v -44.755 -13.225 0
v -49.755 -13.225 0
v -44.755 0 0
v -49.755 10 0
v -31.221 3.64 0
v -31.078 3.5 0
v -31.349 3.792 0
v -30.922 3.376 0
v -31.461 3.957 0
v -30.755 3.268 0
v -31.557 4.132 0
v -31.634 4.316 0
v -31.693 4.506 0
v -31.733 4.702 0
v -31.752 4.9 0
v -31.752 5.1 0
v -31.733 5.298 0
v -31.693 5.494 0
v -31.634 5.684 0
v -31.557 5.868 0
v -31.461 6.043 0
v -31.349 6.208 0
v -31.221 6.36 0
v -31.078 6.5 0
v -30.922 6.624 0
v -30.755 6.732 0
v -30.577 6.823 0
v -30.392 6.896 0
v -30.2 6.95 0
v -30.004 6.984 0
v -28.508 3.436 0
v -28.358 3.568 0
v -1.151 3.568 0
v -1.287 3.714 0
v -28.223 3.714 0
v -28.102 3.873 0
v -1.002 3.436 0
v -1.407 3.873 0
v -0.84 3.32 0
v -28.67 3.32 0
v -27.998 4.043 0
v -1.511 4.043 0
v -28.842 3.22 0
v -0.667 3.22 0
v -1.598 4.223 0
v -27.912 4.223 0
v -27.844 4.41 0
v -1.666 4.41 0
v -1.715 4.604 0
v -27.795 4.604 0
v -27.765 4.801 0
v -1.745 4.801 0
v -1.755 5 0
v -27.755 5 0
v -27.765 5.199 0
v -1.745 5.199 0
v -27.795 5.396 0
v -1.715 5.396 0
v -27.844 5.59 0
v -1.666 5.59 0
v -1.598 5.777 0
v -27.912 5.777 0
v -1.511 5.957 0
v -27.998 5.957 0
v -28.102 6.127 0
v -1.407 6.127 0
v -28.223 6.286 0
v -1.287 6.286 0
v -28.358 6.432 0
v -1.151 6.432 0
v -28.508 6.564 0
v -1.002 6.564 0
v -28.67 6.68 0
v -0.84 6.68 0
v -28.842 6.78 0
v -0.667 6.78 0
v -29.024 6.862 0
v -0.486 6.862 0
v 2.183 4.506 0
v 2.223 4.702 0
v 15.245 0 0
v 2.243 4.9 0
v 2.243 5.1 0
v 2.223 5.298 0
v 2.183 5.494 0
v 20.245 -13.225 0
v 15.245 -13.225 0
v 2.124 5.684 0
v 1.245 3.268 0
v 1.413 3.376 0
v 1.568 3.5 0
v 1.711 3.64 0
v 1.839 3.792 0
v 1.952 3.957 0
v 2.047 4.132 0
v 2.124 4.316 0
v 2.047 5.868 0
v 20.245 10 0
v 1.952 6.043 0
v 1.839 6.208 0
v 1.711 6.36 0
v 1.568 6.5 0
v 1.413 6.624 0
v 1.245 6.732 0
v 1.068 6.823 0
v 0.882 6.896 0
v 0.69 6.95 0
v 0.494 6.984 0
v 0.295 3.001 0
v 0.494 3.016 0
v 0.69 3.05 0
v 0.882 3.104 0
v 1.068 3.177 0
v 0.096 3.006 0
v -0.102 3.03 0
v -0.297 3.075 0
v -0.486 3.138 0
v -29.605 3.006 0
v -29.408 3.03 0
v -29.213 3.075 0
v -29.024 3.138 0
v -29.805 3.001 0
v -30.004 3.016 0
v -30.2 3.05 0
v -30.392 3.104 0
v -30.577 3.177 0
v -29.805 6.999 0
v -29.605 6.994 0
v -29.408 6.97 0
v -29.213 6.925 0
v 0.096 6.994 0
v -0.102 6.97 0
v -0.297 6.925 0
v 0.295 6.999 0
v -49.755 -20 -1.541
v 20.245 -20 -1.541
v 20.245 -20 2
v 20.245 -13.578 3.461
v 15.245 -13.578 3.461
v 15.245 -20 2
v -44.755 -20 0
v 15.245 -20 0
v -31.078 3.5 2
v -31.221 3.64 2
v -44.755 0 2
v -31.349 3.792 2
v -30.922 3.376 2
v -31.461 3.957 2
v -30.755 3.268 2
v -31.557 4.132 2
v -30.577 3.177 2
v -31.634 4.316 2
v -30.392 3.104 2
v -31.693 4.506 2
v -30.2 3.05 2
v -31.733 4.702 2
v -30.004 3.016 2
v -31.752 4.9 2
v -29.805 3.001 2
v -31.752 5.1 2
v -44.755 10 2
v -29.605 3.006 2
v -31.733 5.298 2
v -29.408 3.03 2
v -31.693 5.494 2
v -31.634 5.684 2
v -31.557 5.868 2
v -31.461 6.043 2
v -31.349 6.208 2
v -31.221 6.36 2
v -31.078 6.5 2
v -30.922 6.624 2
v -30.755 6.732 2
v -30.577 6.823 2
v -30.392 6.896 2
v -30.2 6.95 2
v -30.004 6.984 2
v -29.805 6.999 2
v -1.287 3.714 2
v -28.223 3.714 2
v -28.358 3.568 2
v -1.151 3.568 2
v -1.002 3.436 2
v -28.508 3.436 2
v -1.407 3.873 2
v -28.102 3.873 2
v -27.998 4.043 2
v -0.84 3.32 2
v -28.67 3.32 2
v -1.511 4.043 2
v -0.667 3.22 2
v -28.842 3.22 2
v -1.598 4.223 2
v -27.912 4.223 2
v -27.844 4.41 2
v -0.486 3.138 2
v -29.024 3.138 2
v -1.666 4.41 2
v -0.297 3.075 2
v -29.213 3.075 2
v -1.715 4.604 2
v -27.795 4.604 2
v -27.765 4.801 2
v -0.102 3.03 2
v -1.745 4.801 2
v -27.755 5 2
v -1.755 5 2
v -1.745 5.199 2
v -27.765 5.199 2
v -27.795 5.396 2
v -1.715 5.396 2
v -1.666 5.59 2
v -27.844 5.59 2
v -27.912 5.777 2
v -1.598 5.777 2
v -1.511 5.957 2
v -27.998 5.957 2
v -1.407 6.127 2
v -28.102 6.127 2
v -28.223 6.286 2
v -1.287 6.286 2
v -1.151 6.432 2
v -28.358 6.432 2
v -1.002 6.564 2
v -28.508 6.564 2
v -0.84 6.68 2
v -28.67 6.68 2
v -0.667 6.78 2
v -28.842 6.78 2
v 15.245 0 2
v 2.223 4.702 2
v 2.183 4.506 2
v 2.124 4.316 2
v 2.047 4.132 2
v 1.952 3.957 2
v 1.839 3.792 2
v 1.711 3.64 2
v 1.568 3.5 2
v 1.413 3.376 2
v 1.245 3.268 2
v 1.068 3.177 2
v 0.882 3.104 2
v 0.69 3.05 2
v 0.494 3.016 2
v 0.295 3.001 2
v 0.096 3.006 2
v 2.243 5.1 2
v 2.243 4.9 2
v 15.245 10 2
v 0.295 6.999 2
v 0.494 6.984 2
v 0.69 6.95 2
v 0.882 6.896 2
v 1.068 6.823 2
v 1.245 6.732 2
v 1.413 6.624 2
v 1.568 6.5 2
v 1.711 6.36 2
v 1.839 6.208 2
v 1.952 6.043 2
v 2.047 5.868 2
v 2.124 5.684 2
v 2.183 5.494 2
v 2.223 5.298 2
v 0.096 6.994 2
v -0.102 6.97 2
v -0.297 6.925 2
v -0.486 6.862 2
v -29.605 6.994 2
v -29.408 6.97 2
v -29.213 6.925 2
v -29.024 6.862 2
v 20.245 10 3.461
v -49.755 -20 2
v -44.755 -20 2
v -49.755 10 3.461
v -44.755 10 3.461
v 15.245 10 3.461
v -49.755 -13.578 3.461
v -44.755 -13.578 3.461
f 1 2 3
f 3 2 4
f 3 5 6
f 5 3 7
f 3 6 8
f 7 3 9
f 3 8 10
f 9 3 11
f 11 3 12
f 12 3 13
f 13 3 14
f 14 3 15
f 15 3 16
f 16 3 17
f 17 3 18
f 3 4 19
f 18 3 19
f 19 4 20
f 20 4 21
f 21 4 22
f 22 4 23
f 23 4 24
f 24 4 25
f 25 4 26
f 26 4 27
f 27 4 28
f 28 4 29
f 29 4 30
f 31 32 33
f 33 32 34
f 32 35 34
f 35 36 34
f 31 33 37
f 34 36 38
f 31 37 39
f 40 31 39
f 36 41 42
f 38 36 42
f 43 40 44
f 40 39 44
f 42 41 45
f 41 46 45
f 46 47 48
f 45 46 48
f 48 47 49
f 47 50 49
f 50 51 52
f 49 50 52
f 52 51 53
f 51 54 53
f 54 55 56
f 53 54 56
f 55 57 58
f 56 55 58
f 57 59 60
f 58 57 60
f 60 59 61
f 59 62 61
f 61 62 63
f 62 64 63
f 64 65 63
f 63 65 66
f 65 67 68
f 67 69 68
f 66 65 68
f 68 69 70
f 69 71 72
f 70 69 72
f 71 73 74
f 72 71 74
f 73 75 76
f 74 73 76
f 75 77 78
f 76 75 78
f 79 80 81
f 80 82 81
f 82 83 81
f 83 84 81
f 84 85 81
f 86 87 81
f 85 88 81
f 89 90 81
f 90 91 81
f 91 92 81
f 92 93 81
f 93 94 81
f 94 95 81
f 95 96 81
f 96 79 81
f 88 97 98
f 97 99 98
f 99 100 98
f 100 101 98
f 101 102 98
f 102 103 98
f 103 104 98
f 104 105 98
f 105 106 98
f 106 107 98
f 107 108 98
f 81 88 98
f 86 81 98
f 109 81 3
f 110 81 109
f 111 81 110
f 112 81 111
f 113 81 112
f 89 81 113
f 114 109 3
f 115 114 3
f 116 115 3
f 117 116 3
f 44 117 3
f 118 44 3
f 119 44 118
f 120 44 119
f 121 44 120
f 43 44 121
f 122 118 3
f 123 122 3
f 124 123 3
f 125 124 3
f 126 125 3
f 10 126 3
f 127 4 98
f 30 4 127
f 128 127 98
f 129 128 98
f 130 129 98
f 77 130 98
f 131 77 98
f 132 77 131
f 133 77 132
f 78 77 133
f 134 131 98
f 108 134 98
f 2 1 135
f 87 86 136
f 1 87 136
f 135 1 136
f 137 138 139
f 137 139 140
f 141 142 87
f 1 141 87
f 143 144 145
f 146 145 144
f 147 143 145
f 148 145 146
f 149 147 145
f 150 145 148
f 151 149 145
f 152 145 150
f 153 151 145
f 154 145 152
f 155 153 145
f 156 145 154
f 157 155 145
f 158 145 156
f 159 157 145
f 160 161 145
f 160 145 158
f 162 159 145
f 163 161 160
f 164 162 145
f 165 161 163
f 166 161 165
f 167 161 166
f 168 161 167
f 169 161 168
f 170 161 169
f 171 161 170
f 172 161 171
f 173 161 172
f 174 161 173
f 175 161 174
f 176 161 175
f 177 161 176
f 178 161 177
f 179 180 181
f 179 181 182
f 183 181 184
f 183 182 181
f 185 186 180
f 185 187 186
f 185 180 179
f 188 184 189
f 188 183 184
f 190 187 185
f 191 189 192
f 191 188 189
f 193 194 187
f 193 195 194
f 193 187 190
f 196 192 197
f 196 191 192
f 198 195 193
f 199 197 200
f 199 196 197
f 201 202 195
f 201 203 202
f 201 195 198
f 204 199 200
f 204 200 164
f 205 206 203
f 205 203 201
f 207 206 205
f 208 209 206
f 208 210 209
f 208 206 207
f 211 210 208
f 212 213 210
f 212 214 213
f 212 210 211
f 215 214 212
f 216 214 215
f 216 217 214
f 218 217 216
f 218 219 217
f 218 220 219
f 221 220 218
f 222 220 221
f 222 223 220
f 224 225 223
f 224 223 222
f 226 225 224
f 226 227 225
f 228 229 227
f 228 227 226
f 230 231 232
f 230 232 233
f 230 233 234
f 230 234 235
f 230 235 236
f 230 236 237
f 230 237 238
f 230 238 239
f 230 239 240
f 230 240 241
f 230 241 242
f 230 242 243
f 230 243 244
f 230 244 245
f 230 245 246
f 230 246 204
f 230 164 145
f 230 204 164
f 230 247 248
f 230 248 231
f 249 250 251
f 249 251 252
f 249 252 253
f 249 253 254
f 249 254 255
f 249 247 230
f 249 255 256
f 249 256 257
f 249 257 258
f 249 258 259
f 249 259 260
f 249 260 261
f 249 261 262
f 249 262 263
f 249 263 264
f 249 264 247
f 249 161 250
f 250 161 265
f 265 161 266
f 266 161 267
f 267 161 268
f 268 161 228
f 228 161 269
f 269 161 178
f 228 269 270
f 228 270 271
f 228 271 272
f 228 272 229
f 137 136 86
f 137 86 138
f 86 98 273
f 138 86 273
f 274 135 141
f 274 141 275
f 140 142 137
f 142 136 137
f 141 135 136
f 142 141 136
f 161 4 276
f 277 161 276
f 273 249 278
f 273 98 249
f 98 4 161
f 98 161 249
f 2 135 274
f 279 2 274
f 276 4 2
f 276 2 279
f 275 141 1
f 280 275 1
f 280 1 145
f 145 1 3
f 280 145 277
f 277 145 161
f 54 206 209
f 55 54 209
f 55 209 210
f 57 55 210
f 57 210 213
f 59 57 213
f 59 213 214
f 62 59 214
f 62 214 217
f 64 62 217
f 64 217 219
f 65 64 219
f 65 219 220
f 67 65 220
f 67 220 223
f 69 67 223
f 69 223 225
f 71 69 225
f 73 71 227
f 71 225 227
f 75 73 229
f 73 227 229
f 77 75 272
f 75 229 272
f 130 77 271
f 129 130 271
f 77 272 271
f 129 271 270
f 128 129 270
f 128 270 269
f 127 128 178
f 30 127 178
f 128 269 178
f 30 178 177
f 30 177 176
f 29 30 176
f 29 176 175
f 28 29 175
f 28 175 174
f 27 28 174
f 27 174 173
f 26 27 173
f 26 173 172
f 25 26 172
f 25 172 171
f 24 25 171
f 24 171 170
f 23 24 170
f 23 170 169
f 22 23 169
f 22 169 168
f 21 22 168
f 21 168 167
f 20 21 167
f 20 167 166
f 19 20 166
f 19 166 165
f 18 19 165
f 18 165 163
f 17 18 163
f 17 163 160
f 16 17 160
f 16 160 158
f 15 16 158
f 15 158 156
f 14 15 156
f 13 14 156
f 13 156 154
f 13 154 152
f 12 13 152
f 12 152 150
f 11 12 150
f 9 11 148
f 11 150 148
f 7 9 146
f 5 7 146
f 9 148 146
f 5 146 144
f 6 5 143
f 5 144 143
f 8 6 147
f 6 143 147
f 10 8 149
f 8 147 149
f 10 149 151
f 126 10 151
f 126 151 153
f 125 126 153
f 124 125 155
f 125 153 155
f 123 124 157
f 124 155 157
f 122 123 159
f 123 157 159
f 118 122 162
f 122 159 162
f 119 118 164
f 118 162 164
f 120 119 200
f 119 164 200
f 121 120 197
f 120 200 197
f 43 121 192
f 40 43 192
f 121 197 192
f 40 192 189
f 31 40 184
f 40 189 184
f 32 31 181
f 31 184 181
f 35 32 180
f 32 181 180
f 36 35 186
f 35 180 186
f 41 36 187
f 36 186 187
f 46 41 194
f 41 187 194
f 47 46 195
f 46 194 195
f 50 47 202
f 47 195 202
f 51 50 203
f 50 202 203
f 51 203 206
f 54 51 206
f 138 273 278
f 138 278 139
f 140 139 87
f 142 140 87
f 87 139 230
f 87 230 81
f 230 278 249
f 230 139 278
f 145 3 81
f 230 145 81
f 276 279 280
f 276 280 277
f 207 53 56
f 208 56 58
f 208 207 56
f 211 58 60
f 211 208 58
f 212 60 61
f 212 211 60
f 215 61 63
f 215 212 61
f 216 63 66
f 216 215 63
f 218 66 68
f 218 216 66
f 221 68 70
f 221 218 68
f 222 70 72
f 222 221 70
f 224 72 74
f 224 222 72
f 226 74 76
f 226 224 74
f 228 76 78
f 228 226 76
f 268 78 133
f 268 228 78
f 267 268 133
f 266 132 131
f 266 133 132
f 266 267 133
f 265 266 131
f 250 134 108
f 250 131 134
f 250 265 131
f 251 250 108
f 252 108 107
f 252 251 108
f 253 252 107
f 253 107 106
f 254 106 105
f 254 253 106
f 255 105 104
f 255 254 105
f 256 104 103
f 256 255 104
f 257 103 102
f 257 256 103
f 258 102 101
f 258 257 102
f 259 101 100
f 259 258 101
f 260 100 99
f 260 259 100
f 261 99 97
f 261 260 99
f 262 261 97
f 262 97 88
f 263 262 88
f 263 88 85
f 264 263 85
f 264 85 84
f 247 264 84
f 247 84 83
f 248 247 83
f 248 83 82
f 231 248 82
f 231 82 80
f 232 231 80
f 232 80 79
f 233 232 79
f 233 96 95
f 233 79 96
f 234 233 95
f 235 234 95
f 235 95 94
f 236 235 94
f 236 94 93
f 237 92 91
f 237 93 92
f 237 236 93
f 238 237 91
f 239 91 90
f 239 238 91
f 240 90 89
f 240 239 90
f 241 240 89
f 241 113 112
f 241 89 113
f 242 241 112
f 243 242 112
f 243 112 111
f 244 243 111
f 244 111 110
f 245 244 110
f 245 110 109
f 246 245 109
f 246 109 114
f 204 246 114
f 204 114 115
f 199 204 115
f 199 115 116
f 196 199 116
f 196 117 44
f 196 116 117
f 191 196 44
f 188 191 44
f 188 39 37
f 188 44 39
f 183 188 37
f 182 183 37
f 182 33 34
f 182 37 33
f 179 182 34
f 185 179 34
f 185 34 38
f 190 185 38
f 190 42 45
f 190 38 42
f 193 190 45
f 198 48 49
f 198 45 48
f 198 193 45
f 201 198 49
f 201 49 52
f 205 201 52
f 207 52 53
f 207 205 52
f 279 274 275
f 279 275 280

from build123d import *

# Parameters (mm, degrees)
EXTRUDE_1_DEPTH     = 2
EXTRUDE_2_DEPTH     = 5
EXTRUDE_3_DEPTH     = 5
SKETCH_4_R          = 2
CUT_EXTRUDE_1_DEPTH = 10
EXTRUDE_START       = -70
EXTRUDE_4_DEPTH     = 70


with BuildPart() as part:
    # 草图1 → 凸台-拉伸1 (new body)
    with BuildSketch(Plane.XY):
        Polygon((-44.754893935, 0), (15.245106065, 0), (15.245106065, -20), (20.245106065, -20), (20.245106065, 10), (15.245106065, 10), (-44.754893935, 10), (-49.754893935, 10), (-49.754893935, -20), (-44.754893935, -20), align=None)
    extrude(amount=EXTRUDE_1_DEPTH)

    # 草图2 → 凸台-拉伸2 (add)
    with BuildSketch(Plane.ZY.offset(49.754893935)):
        Polygon((0, 10), (0, -20), (2, -20), (3.461164558, -13.577882357), (3.461164558, 10), align=None)
    extrude(amount=-EXTRUDE_2_DEPTH)

    # 草图3 → 凸台-拉伸3 (add)
    with BuildSketch(Plane(origin=(20.245106065, 0, 0), x_dir=(0, 0, -1), z_dir=(1, 0, 0))):
        Polygon((-2, 10), (-3.461164558, 10), (-3.461164558, -13.577882357), (-2, -20), align=None)
    extrude(amount=-EXTRUDE_3_DEPTH)

    # 草图4 → 切除-拉伸1 (cut)
    with BuildSketch(Plane.XY.offset(2)):
        with Locations((-29.754893935, 5)):
            Circle(SKETCH_4_R)
    cut_extrude_1 = extrude(amount=-CUT_EXTRUDE_1_DEPTH, mode=Mode.SUBTRACT)

    # 镜向2: 切除-拉伸1 across plane
    add(cut_extrude_1.mirror(Plane.ZY.offset(14.754893935)), mode=Mode.SUBTRACT)

    # 草图5 → 凸台-拉伸4 (add)
    with BuildSketch(Plane.ZY.offset(49.754893935).offset(EXTRUDE_START)):
        Polygon((0, -13.225390566), (-1.541363729, -20), (0, -20), align=None)
    extrude_4 = extrude(amount=EXTRUDE_4_DEPTH)

    # 镜向3: 凸台-拉伸4 across plane
    add(extrude_4.mirror(Plane.ZY.offset(14.754893935)))


solid = part.part
